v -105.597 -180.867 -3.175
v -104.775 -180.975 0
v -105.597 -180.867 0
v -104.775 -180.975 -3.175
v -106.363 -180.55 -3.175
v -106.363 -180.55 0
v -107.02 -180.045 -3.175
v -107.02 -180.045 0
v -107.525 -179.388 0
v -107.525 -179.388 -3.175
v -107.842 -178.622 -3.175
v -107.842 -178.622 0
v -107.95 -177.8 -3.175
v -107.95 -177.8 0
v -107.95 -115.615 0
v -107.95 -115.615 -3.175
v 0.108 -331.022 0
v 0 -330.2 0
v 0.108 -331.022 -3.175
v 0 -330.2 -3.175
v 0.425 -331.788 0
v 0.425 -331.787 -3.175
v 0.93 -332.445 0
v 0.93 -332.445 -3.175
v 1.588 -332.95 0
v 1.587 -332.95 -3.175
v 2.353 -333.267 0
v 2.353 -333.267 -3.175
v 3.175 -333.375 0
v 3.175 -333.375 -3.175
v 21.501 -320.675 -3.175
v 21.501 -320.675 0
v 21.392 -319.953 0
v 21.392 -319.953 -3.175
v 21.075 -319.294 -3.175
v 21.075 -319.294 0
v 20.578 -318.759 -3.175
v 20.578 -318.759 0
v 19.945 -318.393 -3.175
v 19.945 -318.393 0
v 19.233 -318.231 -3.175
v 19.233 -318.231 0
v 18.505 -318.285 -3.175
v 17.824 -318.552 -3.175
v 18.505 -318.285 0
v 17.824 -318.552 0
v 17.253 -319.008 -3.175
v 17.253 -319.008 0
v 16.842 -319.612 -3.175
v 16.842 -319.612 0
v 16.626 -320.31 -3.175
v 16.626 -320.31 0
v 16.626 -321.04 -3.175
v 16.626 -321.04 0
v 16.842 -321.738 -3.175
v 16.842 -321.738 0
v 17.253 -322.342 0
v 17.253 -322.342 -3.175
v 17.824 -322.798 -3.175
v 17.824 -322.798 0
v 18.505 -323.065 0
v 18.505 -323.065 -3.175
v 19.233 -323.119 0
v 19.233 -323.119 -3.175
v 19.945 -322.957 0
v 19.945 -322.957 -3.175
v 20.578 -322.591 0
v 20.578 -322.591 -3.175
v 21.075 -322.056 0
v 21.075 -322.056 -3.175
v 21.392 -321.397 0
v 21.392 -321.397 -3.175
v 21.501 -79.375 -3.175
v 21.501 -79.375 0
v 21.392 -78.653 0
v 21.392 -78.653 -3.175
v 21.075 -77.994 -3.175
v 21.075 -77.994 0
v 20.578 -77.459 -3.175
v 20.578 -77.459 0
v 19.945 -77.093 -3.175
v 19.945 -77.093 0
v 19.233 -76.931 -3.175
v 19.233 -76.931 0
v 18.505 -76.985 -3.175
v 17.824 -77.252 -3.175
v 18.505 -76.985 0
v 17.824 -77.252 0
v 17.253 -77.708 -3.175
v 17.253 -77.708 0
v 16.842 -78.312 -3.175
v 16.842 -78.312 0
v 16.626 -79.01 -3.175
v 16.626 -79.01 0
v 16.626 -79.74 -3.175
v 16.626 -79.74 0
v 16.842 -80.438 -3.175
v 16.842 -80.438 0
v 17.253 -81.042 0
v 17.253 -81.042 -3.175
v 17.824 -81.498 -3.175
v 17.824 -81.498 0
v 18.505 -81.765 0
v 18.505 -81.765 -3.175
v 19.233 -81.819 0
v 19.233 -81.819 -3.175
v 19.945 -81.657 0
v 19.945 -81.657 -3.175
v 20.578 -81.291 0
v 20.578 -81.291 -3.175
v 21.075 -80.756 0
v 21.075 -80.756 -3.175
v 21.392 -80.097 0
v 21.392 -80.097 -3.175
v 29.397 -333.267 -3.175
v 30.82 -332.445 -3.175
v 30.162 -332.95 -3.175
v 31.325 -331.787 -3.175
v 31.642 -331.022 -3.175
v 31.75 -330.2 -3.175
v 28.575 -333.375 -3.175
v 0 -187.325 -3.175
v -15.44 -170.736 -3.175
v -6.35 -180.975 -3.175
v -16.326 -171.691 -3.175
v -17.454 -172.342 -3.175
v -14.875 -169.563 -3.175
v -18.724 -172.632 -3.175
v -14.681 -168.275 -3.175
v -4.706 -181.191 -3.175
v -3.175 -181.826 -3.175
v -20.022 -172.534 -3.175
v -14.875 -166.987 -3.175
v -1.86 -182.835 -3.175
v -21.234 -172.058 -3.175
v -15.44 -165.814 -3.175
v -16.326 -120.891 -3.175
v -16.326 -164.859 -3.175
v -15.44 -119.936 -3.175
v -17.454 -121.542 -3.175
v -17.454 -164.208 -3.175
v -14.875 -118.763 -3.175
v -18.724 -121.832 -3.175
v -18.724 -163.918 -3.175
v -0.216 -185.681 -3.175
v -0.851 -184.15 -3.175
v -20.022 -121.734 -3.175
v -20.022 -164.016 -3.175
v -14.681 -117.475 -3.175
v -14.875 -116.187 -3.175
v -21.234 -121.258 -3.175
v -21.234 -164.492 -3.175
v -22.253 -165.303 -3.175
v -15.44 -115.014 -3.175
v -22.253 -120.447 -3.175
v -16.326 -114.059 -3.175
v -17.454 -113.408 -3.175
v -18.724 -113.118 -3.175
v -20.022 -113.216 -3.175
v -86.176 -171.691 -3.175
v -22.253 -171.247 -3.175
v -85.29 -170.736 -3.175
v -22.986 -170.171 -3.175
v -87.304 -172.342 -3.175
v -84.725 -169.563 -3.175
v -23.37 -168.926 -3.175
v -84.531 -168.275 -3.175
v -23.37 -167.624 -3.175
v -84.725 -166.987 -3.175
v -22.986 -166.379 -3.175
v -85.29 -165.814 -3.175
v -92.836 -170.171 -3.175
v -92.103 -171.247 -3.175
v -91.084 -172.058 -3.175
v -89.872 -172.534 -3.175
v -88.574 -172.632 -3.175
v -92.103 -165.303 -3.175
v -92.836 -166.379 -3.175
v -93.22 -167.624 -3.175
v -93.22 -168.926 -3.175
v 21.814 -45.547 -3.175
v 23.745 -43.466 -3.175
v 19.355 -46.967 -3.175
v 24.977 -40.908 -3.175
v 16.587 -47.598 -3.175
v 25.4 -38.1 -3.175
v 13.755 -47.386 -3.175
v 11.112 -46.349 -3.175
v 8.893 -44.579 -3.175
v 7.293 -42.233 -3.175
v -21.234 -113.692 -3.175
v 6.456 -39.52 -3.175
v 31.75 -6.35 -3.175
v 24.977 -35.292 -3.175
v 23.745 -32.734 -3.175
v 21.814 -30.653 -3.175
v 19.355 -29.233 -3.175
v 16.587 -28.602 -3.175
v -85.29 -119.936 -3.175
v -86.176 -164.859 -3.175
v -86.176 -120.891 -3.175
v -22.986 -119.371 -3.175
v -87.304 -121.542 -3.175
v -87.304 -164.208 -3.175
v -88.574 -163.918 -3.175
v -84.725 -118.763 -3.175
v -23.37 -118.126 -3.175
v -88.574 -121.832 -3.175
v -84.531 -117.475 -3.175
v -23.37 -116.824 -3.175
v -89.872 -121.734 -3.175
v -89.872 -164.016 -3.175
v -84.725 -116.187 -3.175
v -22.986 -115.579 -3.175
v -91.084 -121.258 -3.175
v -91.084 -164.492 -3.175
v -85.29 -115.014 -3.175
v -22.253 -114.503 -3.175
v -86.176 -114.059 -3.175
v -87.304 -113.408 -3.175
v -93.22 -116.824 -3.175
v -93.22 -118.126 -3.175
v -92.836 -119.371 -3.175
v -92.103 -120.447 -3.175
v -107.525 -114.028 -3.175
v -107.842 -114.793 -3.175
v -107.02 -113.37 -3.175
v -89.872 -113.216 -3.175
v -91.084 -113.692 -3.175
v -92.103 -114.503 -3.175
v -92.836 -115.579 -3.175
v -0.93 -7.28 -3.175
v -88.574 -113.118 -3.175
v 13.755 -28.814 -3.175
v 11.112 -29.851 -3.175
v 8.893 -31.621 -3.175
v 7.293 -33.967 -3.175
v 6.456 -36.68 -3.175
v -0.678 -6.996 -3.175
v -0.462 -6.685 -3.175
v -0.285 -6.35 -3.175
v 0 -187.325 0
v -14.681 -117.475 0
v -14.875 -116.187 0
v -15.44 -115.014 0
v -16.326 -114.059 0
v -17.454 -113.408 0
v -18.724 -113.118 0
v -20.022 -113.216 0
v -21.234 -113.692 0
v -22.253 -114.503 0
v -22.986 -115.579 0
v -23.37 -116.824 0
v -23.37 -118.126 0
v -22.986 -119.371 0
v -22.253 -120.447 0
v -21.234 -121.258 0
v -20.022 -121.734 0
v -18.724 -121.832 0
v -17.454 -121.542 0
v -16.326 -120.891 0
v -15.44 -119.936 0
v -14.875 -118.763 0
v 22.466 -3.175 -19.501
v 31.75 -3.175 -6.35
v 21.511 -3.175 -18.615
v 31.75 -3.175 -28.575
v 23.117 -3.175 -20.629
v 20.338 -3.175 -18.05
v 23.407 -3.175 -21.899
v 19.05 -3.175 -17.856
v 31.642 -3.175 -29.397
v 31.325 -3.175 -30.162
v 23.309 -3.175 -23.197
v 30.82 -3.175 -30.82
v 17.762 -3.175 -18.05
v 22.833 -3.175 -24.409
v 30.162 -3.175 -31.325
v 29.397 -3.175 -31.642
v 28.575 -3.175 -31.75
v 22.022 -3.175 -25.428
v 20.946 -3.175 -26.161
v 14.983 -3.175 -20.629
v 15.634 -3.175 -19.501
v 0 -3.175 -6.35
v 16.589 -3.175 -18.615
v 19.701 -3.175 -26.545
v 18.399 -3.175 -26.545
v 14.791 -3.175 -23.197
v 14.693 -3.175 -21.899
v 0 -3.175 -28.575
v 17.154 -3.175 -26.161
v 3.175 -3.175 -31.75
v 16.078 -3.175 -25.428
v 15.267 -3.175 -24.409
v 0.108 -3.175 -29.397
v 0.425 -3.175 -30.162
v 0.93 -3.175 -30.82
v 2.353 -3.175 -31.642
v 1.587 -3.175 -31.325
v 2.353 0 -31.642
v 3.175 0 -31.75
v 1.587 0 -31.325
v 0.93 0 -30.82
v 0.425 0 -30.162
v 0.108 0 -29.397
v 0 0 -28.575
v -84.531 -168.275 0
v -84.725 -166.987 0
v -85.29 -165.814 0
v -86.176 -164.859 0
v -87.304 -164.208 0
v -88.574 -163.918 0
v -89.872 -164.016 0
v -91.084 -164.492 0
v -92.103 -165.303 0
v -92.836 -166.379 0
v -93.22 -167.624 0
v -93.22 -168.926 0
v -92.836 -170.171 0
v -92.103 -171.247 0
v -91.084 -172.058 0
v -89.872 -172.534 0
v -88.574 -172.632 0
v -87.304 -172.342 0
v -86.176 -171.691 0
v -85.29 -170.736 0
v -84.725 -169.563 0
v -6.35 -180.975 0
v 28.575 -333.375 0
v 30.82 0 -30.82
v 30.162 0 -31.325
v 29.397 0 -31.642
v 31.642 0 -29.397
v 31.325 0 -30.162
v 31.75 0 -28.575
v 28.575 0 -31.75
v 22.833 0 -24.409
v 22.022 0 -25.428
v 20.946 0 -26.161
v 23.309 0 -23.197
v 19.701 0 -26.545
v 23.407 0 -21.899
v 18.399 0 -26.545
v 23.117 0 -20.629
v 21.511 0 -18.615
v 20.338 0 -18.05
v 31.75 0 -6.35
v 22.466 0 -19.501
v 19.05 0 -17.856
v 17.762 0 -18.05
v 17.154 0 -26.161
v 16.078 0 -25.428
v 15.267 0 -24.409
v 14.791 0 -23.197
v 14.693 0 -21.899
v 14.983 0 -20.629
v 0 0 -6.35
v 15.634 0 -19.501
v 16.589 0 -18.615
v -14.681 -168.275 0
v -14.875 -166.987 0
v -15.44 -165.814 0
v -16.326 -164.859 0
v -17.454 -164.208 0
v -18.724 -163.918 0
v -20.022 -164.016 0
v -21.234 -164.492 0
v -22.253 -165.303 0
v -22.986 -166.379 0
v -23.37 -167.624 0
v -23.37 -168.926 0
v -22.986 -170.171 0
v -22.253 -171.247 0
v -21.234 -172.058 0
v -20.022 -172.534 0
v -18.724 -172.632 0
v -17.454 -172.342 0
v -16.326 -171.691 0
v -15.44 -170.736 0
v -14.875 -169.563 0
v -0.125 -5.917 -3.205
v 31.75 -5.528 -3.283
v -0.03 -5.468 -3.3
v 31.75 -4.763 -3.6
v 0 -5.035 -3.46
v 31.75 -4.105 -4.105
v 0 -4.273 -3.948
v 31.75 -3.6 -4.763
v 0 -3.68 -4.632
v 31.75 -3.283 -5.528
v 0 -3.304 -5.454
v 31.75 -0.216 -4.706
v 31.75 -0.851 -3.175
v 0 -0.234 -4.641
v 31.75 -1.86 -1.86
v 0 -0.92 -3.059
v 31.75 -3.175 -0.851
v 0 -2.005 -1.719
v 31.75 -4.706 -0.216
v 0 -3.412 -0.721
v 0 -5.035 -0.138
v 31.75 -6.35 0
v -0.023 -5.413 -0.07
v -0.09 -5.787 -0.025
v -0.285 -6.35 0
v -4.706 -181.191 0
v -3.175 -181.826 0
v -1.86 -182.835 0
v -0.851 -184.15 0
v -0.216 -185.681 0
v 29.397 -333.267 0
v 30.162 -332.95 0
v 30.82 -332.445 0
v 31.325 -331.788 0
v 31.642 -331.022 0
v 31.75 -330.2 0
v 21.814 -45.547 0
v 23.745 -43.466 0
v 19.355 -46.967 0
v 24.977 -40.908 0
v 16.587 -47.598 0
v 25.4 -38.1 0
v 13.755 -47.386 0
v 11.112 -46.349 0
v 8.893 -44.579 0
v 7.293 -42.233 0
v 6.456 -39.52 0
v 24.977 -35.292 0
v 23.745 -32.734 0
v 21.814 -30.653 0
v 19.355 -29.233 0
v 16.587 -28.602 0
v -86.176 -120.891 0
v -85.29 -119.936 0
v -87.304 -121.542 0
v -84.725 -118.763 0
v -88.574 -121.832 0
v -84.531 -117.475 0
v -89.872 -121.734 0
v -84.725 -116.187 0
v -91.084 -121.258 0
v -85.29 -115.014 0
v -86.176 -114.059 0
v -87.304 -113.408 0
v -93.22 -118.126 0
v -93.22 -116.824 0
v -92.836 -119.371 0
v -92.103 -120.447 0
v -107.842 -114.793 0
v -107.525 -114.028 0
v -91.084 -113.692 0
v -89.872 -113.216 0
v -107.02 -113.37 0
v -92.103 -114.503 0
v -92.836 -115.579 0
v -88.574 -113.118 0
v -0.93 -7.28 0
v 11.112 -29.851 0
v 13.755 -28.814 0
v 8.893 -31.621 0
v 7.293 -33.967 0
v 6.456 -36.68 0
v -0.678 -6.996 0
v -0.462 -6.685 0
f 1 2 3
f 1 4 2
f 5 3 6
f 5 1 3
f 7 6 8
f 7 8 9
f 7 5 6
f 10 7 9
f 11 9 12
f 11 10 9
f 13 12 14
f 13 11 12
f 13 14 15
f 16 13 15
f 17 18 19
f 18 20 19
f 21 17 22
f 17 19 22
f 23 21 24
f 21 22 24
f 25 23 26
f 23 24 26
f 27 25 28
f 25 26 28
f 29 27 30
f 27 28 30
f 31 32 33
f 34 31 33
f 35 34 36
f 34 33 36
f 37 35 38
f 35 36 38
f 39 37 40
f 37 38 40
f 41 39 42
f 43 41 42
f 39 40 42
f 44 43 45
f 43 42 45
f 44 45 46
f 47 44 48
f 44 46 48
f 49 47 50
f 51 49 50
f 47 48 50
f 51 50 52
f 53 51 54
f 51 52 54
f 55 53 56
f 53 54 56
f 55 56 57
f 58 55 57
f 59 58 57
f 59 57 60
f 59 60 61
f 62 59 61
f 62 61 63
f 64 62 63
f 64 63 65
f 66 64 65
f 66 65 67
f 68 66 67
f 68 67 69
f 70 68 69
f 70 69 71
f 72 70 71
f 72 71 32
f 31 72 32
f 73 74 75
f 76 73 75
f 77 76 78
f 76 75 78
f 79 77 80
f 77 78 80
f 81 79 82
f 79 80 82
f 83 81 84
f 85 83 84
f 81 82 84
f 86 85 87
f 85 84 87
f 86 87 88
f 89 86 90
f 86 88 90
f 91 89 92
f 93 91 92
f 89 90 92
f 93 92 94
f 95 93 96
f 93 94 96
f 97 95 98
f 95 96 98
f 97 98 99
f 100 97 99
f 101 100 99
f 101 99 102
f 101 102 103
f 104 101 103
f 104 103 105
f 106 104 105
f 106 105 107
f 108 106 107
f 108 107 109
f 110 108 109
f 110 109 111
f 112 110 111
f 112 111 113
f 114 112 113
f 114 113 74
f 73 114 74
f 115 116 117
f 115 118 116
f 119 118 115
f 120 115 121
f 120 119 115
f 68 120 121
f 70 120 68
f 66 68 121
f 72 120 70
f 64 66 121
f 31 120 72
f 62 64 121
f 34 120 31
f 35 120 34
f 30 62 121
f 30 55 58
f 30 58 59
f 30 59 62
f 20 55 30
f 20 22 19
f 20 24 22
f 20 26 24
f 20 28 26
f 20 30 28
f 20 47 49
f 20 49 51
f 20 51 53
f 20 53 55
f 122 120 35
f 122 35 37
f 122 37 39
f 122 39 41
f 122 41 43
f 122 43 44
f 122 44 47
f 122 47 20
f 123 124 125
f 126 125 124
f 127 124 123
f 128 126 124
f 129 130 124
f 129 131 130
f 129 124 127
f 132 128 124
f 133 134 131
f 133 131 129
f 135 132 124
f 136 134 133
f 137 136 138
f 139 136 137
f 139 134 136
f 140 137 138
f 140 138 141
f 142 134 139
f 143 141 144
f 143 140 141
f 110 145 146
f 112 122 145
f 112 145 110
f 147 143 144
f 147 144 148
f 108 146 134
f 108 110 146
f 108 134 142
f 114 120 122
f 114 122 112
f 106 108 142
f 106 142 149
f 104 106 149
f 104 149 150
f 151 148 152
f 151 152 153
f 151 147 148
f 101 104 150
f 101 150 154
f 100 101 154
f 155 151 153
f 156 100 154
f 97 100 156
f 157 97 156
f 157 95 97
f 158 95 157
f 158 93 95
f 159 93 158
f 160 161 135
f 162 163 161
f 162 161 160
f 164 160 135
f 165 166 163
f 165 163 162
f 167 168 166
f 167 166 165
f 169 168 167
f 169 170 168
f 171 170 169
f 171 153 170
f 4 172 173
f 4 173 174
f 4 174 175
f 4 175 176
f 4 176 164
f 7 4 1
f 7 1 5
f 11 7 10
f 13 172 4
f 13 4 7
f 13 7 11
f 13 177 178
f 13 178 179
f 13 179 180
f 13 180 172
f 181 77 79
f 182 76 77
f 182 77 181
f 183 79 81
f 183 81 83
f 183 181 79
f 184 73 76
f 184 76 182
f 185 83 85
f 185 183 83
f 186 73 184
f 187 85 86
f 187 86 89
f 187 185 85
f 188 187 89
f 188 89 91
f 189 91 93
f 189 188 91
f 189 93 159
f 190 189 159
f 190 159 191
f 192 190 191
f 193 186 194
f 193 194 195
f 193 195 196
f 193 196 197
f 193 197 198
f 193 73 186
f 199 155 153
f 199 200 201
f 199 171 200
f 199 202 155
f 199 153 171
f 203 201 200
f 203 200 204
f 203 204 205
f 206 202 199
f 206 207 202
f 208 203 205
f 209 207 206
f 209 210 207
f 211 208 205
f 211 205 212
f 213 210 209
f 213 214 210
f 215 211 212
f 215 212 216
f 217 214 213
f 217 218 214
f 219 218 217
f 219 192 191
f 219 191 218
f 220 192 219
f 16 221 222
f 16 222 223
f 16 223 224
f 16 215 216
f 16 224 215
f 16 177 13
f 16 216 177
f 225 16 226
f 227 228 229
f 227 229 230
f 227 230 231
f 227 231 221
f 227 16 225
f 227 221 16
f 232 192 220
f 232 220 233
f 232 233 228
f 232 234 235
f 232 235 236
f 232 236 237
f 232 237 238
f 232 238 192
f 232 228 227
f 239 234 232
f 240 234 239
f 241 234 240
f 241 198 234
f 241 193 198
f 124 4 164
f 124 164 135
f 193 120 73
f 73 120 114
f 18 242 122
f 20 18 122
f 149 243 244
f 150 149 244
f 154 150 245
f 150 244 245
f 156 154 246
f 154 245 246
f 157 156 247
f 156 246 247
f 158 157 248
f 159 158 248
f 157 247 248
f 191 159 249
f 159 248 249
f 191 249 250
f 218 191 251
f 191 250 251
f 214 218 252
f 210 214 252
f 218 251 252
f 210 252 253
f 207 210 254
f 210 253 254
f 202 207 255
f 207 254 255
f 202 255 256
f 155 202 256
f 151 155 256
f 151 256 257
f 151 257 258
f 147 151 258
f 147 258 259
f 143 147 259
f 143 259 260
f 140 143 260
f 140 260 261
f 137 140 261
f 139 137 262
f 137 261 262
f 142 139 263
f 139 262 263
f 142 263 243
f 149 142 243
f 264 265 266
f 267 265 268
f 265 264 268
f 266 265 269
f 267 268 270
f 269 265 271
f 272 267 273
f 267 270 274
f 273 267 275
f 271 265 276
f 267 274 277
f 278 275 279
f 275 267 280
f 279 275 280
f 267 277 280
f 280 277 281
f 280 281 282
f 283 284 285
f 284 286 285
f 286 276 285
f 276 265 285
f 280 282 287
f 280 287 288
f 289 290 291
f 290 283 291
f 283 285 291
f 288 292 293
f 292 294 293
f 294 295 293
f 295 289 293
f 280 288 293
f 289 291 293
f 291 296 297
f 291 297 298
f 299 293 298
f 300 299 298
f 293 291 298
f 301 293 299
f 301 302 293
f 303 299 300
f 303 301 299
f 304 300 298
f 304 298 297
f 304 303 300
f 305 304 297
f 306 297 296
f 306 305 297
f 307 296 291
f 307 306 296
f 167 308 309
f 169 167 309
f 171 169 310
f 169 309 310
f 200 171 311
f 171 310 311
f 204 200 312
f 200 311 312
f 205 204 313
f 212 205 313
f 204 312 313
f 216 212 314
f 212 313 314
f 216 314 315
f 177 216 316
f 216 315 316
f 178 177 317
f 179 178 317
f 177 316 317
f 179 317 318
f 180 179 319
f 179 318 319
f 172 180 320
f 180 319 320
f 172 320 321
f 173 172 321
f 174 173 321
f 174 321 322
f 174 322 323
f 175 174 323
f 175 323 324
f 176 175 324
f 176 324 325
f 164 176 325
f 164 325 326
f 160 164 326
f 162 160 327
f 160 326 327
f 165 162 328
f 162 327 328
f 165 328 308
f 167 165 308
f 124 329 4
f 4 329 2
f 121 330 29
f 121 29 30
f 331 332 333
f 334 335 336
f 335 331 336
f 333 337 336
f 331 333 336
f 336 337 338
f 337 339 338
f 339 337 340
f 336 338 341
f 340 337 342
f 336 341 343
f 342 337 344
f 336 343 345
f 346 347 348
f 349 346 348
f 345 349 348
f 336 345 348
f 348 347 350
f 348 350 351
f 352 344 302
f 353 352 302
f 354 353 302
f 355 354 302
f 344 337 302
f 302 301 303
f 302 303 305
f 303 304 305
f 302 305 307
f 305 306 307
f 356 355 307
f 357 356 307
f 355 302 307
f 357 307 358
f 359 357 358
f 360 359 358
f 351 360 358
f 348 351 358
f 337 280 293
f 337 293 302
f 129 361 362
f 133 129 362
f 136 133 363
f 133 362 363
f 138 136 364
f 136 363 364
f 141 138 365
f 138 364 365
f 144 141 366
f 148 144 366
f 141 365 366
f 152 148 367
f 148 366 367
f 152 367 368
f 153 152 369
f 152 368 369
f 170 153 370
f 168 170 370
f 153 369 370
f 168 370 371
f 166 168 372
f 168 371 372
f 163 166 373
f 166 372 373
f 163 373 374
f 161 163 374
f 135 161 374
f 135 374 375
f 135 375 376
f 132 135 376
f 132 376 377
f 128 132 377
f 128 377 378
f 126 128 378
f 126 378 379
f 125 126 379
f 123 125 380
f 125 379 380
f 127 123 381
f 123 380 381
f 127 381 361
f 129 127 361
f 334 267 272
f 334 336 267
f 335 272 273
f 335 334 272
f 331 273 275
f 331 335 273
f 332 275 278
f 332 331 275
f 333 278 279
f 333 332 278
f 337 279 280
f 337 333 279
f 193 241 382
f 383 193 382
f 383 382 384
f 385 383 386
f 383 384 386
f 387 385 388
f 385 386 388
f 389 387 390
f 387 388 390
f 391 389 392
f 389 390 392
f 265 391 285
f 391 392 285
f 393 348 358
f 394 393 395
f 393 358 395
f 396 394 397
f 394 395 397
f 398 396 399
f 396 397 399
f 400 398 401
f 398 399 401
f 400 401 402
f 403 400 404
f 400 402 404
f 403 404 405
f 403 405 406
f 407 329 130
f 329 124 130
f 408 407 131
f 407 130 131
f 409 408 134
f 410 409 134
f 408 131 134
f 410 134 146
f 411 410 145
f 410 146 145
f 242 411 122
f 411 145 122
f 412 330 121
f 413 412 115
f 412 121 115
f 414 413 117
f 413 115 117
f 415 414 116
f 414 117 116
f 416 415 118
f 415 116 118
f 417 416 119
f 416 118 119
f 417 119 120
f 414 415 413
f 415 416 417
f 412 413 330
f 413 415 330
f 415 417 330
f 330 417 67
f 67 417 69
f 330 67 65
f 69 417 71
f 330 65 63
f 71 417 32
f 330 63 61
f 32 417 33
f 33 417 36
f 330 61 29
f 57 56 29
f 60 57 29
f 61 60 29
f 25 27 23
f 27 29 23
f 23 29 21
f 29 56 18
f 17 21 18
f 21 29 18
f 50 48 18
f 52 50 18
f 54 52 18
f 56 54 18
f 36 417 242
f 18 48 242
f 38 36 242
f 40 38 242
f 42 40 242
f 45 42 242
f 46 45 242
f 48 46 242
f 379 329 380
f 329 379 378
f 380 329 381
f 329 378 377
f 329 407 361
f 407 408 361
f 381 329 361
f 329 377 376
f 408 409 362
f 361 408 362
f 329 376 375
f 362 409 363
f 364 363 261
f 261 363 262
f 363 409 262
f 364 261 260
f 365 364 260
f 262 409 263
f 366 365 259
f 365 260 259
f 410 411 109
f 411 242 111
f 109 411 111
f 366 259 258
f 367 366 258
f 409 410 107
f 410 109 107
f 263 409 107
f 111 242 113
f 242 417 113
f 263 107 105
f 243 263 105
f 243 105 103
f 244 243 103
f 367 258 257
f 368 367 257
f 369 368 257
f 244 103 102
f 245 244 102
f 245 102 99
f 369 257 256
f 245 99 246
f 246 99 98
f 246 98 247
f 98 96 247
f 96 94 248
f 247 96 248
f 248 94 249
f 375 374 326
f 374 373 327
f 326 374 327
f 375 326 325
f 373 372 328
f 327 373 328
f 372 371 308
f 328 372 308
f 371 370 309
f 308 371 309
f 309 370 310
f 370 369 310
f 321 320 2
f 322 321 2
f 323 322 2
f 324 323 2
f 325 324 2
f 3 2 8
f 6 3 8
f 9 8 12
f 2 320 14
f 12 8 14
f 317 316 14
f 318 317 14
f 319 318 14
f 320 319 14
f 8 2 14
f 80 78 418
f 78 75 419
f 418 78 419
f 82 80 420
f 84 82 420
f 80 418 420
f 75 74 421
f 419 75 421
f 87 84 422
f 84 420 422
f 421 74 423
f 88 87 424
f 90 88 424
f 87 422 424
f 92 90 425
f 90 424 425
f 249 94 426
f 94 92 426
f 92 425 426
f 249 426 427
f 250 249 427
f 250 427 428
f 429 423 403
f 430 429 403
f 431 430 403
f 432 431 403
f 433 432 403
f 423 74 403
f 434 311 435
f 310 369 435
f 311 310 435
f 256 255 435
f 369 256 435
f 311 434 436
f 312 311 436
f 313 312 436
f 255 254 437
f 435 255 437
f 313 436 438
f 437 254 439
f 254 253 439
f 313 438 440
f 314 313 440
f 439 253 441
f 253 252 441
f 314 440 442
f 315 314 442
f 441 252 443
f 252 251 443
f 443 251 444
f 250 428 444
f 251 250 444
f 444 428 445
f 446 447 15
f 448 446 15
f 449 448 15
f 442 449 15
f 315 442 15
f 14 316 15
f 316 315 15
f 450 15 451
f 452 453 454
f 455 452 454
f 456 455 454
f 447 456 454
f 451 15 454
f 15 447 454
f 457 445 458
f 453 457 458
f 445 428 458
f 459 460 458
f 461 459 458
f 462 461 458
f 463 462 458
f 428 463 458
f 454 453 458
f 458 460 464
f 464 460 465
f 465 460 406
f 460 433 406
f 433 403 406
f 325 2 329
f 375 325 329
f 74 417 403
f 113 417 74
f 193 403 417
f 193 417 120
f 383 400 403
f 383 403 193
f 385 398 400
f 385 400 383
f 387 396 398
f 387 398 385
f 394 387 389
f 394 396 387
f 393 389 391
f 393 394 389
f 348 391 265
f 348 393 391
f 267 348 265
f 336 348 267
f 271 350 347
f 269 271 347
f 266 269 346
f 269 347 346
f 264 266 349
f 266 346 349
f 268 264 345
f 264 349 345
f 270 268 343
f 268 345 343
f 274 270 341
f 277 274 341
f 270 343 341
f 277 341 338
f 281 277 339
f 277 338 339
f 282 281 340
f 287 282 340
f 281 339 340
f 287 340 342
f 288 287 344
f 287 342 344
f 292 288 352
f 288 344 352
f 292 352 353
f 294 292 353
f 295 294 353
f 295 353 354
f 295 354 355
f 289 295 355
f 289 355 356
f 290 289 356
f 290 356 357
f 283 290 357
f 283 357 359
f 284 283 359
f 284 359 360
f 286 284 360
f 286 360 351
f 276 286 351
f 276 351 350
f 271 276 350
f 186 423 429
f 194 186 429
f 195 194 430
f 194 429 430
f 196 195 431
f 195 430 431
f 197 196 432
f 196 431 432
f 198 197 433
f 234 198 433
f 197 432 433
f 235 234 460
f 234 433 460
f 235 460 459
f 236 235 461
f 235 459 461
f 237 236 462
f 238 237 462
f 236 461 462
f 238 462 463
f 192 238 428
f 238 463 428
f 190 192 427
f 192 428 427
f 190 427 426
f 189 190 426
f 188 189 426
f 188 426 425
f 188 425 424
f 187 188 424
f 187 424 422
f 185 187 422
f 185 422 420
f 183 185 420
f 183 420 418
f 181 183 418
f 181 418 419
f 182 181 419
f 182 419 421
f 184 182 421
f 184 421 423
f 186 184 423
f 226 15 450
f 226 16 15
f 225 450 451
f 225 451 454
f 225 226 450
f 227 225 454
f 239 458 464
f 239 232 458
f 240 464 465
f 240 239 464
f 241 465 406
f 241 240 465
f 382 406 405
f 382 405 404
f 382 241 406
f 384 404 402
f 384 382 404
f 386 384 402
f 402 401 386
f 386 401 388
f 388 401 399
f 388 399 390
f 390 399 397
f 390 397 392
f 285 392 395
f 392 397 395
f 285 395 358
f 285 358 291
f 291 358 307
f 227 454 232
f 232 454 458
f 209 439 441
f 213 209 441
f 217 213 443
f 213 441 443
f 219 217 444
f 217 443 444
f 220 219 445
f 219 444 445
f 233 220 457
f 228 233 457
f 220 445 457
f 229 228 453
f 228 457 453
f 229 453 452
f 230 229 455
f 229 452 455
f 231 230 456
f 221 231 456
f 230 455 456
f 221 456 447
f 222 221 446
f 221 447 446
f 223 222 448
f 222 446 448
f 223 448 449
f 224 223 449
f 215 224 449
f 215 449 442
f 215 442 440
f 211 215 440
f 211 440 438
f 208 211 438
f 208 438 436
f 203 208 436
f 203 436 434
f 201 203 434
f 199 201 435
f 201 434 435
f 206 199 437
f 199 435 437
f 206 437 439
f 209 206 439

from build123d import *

# Parameters (mm, degrees)
BASE_FLANGE1_DEPTH  = 31.75
SKETCH6_R           = 4.3688
CUT_EXTRUDE1_DEPTH  = 337.385219094
SKETCH7_R           = 2.4511
SKETCH7_R_2         = 9.525
CUT_EXTRUDE2_DEPTH  = 337.385219094
SKETCH8_R           = 4.3688
BOSS_EXTRUDE1_DEPTH = 3.175
FILLET1_R           = 6.35
FILLET2_R           = 3.175


# Sheet-metal steps are written as plain solids
with BuildPart() as part:
    # Sketch1 → Base-Flange1 (new body)
    with BuildSketch(Plane(origin=(0, 0, 0), x_dir=(0, 0, -1), z_dir=(1, 0, 0))):
        with BuildLine():
            Line((31.75, 0), (6.35, 0))
            ThreePointArc((6.35, 0), (1.859871939, -1.859871939), (0, -6.35))
            Line((0, -6.35), (0, -333.375))
            Line((0, -333.375), (3.175, -333.375))
            Line((3.175, -333.375), (3.175, -6.35))
            ThreePointArc((3.175, -6.35), (4.10493597, -4.10493597), (6.35, -3.175))
            Line((6.35, -3.175), (31.75, -3.175))
            Line((31.75, -3.175), (31.75, 0))
        make_face()
    extrude(amount=BASE_FLANGE1_DEPTH)

    # Sketch6 → Cut-Extrude1 (cut, through all)
    with BuildSketch(Plane(origin=(0, 0, 0), x_dir=(1, 0, 0), z_dir=(0, 1, 0))):
        with Locations(Location((19.05, 22.225, 0), (0, 0, 270))):
            Circle(SKETCH6_R)
    extrude(amount=-CUT_EXTRUDE1_DEPTH, mode=Mode.SUBTRACT)

    # Sketch7 → Cut-Extrude2 (cut, through all)
    with BuildSketch(Plane.XY):
        with Locations((19.05, -79.375)):
            Circle(SKETCH7_R)
        with Locations((19.05, -320.675)):
            Circle(SKETCH7_R)
        with Locations((15.875, -38.1)):
            Circle(SKETCH7_R_2)
    extrude(amount=-CUT_EXTRUDE2_DEPTH, mode=Mode.SUBTRACT)

    # Sketch8 → Boss-Extrude1 (add)
    with BuildSketch(Plane.XY):
        Polygon((-107.95, -180.975), (-107.95, -114.3), (0, -6.35), (0, -180.975), align=None)
        with Locations((-88.9, -117.475)):
            Circle(SKETCH8_R, mode=Mode.SUBTRACT)
        with Locations((-19.05, -117.475)):
            Circle(SKETCH8_R, mode=Mode.SUBTRACT)
        with Locations((-88.9, -168.275)):
            Circle(SKETCH8_R, mode=Mode.SUBTRACT)
        with Locations((-19.05, -168.275)):
            Circle(SKETCH8_R, mode=Mode.SUBTRACT)
    extrude(amount=-BOSS_EXTRUDE1_DEPTH)

    # Fillet1
    fillet1_edges = [part.edges().sort_by_distance(p)[0] for p in [
        (0, -180.975, -1.5875),
    ]]
    fillet(fillet1_edges, radius=FILLET1_R)

    # Fillet2
    fillet2_edges = [part.edges().sort_by_distance(p)[0] for p in [
        (0, -6.35, -1.5875),
        (31.75, -1.5875, -31.75),
        (-107.95, -180.975, -1.5875),
        (-107.95, -114.3, -1.5875),
        (0, -1.5875, -31.75),
        (31.75, -333.375, -1.5875),
        (0, -333.375, -1.5875),
    ]]
    fillet(fillet2_edges, radius=FILLET2_R)


solid = part.part
